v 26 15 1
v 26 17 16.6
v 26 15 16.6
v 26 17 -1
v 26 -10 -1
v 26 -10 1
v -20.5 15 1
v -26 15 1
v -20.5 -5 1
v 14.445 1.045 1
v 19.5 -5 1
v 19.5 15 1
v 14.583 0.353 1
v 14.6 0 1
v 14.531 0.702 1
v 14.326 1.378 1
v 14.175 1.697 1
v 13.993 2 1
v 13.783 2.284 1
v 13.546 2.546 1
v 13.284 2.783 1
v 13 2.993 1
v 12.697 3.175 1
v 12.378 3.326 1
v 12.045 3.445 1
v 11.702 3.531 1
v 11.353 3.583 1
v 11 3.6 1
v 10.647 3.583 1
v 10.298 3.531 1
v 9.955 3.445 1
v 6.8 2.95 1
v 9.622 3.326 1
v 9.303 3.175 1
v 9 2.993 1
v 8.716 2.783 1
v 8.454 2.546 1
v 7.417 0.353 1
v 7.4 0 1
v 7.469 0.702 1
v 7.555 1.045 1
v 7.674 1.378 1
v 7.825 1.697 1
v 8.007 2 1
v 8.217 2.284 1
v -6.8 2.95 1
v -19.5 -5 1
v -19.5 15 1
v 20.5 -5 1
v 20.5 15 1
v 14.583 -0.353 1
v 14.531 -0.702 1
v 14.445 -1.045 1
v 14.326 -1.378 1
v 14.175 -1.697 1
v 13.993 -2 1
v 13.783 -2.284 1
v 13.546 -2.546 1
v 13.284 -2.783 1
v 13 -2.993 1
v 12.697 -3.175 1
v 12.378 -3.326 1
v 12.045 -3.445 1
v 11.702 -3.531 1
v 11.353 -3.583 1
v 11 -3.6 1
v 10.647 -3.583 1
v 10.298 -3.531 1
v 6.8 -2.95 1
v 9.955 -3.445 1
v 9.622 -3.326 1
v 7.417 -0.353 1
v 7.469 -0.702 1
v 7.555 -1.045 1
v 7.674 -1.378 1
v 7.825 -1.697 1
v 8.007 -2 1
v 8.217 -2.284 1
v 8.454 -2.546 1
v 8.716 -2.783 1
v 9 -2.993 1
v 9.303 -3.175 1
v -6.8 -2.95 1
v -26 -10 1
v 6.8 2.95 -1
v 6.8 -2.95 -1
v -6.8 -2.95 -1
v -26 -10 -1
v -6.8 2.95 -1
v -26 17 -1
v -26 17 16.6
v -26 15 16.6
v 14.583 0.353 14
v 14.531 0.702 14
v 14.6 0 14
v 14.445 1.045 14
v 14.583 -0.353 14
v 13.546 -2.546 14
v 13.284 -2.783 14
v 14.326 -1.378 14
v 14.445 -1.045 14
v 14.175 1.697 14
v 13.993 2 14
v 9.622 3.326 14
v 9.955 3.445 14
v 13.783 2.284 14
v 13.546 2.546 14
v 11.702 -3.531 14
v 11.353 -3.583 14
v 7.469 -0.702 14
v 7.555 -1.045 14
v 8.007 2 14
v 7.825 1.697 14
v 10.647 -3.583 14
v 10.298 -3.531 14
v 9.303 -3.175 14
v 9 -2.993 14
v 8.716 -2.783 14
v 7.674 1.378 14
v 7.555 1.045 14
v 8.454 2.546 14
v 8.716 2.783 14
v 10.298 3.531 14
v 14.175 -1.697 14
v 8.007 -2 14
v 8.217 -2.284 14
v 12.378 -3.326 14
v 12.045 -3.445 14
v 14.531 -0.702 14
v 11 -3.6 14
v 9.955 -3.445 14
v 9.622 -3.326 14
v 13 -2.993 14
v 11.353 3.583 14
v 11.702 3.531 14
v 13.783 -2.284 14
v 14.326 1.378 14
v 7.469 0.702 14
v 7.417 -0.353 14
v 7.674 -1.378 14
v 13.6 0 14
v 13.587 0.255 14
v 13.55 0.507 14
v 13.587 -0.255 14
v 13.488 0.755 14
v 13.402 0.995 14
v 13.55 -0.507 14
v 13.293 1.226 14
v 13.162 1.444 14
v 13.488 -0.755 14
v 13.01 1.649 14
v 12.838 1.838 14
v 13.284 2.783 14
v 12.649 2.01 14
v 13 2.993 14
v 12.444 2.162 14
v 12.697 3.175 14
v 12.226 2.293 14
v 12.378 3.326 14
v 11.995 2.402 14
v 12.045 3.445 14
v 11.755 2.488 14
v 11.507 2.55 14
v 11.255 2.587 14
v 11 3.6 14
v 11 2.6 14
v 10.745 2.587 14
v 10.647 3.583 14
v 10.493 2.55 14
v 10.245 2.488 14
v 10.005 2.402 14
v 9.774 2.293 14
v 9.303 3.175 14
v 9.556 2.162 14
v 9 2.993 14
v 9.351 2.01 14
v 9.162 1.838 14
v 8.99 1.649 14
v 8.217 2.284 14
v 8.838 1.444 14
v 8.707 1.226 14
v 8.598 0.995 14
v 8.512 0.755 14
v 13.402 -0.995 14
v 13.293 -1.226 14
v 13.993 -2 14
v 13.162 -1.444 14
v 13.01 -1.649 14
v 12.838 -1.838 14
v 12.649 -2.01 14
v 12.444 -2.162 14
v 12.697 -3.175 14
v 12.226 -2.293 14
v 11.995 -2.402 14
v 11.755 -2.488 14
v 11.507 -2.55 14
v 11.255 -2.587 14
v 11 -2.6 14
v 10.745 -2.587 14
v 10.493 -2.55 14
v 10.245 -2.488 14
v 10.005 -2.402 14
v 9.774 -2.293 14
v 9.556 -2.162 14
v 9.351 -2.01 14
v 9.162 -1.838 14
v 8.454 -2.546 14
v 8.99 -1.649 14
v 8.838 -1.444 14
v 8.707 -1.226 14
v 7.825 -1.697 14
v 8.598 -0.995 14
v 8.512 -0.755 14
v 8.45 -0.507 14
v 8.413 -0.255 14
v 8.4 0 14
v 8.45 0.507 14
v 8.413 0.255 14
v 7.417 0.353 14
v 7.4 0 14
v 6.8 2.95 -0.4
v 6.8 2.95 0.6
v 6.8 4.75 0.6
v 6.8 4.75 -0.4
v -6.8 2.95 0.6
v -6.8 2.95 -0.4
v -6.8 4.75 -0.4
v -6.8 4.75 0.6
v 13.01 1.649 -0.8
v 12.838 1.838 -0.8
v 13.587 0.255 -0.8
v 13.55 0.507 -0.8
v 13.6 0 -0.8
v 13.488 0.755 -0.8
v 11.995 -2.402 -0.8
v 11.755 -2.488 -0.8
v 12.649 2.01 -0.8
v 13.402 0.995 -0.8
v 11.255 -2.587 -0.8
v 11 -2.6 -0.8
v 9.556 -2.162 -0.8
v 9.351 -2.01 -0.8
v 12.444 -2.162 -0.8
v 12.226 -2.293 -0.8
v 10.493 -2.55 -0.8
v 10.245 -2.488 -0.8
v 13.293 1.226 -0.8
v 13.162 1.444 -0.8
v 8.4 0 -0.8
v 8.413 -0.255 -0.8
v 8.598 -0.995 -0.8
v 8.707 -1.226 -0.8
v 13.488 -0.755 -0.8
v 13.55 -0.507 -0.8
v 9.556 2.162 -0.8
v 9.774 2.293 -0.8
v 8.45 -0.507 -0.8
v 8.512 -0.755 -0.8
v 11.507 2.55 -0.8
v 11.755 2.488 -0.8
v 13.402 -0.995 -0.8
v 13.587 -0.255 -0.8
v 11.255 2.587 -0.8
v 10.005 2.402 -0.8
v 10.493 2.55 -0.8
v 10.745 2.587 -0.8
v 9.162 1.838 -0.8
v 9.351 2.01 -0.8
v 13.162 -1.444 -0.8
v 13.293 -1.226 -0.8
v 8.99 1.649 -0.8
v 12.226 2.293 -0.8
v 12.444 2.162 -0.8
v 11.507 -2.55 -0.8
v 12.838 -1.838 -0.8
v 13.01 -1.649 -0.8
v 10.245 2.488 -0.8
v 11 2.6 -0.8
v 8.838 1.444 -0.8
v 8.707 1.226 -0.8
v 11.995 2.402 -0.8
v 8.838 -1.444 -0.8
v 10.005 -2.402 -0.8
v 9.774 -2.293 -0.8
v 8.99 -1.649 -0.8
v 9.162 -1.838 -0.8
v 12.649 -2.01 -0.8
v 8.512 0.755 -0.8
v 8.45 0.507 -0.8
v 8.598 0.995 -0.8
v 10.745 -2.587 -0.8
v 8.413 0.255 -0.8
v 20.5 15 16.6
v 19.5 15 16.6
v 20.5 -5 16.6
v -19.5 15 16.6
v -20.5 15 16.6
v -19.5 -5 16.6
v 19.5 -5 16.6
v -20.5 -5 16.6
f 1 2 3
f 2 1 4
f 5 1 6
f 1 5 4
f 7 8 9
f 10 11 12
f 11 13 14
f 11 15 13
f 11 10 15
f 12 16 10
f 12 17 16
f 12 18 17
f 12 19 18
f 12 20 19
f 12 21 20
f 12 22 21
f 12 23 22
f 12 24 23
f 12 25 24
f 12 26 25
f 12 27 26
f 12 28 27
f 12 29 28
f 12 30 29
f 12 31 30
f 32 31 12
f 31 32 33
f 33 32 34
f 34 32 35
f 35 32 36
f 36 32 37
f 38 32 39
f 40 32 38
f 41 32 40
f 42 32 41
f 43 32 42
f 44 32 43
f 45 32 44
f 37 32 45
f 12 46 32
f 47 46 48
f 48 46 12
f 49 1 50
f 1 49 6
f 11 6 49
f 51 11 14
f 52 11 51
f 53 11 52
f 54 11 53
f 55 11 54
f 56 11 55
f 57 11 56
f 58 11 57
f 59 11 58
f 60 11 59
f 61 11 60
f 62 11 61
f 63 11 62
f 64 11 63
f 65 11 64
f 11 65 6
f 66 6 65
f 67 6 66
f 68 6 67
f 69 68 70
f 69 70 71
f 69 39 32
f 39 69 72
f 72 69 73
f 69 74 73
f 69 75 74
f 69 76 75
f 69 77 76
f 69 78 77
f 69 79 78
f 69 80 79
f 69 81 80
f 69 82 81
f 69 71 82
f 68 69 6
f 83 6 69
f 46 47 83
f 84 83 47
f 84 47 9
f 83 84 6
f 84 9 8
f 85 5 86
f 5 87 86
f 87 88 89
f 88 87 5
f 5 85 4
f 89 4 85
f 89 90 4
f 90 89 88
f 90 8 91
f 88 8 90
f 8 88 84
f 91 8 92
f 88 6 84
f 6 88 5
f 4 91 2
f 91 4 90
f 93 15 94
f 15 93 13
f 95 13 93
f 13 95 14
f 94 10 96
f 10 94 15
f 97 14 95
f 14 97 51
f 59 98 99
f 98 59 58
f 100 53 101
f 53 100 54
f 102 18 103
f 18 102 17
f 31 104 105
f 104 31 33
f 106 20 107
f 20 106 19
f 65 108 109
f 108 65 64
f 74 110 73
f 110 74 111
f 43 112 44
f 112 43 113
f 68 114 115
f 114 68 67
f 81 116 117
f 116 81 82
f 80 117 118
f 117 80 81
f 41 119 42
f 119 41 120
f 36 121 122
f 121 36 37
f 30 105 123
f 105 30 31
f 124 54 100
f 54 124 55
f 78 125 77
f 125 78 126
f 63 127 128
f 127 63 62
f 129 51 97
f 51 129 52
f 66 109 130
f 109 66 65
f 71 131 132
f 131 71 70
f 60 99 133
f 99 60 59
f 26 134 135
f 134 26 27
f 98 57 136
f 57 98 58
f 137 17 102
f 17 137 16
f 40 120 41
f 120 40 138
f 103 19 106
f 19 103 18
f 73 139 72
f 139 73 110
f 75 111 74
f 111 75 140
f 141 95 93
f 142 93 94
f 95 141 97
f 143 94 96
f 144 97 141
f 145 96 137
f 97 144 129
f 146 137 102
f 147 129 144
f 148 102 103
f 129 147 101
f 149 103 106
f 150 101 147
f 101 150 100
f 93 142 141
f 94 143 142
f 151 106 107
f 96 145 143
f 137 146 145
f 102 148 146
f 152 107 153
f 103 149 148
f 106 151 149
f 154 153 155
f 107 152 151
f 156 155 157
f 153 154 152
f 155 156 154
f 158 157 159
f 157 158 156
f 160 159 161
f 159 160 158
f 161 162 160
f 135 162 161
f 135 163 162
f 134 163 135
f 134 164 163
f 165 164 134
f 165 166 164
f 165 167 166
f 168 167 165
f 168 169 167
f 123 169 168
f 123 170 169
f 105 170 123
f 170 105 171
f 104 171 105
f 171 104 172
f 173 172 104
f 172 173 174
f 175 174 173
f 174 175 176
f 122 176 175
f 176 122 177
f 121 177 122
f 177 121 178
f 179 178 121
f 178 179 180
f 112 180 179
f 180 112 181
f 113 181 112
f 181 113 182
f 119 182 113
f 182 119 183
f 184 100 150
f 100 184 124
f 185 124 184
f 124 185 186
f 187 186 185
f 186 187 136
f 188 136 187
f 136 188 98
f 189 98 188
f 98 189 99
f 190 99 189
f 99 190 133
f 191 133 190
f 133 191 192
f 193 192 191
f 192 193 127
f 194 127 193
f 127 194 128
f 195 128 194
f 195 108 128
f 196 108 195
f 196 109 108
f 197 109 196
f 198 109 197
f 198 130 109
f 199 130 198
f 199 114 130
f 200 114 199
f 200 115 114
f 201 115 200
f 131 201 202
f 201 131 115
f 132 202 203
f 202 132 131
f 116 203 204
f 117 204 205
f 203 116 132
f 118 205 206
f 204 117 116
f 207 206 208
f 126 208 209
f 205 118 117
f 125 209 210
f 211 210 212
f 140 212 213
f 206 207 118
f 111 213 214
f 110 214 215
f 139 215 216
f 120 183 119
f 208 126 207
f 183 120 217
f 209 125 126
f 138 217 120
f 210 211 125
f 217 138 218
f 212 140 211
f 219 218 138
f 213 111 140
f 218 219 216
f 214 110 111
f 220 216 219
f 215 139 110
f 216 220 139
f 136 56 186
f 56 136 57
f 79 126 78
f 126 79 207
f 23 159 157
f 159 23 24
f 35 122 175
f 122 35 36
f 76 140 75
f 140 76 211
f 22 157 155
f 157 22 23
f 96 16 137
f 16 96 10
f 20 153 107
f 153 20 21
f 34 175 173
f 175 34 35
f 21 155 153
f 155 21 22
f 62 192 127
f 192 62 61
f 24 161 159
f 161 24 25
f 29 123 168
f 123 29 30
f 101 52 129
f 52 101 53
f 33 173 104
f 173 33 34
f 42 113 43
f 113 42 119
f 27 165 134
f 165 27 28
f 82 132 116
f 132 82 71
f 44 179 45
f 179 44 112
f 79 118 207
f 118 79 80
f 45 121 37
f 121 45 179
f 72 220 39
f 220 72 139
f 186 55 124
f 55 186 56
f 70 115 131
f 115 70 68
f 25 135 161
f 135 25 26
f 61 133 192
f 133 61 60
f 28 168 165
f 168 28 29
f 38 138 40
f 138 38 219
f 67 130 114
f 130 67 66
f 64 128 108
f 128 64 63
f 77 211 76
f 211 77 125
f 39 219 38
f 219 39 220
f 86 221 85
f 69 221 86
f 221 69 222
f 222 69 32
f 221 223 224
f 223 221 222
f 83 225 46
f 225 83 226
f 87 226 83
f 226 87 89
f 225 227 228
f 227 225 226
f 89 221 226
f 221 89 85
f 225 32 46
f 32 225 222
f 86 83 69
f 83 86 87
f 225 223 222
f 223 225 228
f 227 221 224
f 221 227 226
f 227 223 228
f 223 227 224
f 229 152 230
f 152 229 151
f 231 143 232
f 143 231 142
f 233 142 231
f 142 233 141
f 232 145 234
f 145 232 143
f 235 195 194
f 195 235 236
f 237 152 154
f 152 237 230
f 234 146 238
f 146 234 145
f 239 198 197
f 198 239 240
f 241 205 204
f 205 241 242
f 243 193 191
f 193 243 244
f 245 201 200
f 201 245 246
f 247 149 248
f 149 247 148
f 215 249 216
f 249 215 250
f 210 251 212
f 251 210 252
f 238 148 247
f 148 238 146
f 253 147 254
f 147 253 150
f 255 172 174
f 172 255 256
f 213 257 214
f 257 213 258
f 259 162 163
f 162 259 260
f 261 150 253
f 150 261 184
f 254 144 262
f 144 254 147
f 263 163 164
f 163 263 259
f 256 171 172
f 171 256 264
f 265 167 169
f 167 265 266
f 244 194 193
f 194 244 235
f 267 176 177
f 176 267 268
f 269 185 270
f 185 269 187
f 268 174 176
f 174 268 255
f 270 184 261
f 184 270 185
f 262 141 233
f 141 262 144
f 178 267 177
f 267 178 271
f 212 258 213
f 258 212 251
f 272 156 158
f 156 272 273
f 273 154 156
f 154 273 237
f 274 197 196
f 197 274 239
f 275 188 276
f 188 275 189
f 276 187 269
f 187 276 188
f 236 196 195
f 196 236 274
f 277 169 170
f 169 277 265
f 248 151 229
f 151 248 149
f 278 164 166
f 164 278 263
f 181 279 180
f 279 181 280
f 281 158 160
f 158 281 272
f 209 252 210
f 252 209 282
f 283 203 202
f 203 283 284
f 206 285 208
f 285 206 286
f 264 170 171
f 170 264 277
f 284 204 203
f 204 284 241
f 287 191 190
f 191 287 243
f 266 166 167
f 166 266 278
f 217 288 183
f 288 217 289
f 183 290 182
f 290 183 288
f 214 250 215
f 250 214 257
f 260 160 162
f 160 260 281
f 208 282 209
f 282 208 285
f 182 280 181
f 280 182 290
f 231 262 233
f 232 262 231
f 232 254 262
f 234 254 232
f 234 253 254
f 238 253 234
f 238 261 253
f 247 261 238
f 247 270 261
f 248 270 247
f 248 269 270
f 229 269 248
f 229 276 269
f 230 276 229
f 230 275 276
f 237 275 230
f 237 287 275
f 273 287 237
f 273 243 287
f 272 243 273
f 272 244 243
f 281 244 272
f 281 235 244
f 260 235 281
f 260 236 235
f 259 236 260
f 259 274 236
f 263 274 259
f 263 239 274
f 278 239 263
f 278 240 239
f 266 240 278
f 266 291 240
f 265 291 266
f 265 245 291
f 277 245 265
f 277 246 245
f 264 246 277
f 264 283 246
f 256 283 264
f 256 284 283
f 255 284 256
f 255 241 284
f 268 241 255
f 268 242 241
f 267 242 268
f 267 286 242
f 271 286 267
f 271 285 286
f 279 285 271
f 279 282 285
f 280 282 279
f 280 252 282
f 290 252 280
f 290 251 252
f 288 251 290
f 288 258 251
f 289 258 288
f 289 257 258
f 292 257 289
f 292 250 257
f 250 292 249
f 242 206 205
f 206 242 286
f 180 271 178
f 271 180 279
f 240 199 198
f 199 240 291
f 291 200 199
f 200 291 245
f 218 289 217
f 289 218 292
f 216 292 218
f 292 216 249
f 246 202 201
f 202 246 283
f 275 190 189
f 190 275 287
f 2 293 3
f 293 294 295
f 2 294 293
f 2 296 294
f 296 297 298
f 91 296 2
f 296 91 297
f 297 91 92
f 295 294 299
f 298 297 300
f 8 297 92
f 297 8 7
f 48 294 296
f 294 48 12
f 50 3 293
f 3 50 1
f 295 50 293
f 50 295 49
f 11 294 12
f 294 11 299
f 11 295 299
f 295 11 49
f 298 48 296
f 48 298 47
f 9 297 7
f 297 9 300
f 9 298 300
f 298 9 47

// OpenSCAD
// Outside variables
thickness=2;
boardY=52;
mountHeight=5;

//Variables for all modules
frontX=boardY;
frontY=20;
frontZ=thickness;
frontExtra=17.6-thickness;

LDRd=5.0;
LDRpipe=14;
LDRoffset=11;
usbX=13.4;
usbY=5.7;
gap=0.2;

usbBoardThickness=1.8;
usbBoardIndent=1;


//Actual front plate without orienting transformations
module frontPlateNT()
{
  difference()
  {
    union(){
      // Front panel centered for holes etc
      cube([frontX,frontY,frontZ],center=true);
      //Extra bottom panel to each board mount
      translate([0,frontY/2+mountHeight/2+thickness/2,0])cube([frontX,mountHeight+thickness,frontZ],center=true);
      //LDR pipe
      translate([LDRoffset,0,LDRpipe/2])cylinder(d=LDRd+gap+2,h=LDRpipe,center=true,$fn=64);
    }    
    //USB opening
    cube([usbX+gap,usbY+gap,frontZ+0.1],center=true);    
    // USB board notch
    translate([0,(usbY+gap+usbBoardThickness)/2,(thickness-usbBoardThickness)/2])
        cube([usbX+gap,usbBoardThickness,usbBoardIndent],center=true);    

    // LDR pipe hole
    translate([LDRoffset,0,0.2+LDRpipe/2])cylinder(d=LDRd+gap,h=frontZ+LDRpipe,center=true,$fn=64);
  }
  //Extra front board
  translate([0,frontY/2+mountHeight+thickness/2,(frontExtra+thickness)/2])cube([frontX,thickness,frontExtra],center=true);

  // spacers
  translate([20,frontY/2-mountHeight,(frontExtra+thickness)/2])cube([1,frontY,frontExtra],center=true);
  translate([-20,frontY/2-mountHeight,(frontExtra+thickness)/2])cube([1,frontY,frontExtra],center=true);
}

//Orient to fit pieces together
module frontPlate()
{
  translate([0,-frontY/2-mountHeight-thickness/2,-frontExtra-thickness/2])
    frontPlateNT();
}


frontPlateNT();
